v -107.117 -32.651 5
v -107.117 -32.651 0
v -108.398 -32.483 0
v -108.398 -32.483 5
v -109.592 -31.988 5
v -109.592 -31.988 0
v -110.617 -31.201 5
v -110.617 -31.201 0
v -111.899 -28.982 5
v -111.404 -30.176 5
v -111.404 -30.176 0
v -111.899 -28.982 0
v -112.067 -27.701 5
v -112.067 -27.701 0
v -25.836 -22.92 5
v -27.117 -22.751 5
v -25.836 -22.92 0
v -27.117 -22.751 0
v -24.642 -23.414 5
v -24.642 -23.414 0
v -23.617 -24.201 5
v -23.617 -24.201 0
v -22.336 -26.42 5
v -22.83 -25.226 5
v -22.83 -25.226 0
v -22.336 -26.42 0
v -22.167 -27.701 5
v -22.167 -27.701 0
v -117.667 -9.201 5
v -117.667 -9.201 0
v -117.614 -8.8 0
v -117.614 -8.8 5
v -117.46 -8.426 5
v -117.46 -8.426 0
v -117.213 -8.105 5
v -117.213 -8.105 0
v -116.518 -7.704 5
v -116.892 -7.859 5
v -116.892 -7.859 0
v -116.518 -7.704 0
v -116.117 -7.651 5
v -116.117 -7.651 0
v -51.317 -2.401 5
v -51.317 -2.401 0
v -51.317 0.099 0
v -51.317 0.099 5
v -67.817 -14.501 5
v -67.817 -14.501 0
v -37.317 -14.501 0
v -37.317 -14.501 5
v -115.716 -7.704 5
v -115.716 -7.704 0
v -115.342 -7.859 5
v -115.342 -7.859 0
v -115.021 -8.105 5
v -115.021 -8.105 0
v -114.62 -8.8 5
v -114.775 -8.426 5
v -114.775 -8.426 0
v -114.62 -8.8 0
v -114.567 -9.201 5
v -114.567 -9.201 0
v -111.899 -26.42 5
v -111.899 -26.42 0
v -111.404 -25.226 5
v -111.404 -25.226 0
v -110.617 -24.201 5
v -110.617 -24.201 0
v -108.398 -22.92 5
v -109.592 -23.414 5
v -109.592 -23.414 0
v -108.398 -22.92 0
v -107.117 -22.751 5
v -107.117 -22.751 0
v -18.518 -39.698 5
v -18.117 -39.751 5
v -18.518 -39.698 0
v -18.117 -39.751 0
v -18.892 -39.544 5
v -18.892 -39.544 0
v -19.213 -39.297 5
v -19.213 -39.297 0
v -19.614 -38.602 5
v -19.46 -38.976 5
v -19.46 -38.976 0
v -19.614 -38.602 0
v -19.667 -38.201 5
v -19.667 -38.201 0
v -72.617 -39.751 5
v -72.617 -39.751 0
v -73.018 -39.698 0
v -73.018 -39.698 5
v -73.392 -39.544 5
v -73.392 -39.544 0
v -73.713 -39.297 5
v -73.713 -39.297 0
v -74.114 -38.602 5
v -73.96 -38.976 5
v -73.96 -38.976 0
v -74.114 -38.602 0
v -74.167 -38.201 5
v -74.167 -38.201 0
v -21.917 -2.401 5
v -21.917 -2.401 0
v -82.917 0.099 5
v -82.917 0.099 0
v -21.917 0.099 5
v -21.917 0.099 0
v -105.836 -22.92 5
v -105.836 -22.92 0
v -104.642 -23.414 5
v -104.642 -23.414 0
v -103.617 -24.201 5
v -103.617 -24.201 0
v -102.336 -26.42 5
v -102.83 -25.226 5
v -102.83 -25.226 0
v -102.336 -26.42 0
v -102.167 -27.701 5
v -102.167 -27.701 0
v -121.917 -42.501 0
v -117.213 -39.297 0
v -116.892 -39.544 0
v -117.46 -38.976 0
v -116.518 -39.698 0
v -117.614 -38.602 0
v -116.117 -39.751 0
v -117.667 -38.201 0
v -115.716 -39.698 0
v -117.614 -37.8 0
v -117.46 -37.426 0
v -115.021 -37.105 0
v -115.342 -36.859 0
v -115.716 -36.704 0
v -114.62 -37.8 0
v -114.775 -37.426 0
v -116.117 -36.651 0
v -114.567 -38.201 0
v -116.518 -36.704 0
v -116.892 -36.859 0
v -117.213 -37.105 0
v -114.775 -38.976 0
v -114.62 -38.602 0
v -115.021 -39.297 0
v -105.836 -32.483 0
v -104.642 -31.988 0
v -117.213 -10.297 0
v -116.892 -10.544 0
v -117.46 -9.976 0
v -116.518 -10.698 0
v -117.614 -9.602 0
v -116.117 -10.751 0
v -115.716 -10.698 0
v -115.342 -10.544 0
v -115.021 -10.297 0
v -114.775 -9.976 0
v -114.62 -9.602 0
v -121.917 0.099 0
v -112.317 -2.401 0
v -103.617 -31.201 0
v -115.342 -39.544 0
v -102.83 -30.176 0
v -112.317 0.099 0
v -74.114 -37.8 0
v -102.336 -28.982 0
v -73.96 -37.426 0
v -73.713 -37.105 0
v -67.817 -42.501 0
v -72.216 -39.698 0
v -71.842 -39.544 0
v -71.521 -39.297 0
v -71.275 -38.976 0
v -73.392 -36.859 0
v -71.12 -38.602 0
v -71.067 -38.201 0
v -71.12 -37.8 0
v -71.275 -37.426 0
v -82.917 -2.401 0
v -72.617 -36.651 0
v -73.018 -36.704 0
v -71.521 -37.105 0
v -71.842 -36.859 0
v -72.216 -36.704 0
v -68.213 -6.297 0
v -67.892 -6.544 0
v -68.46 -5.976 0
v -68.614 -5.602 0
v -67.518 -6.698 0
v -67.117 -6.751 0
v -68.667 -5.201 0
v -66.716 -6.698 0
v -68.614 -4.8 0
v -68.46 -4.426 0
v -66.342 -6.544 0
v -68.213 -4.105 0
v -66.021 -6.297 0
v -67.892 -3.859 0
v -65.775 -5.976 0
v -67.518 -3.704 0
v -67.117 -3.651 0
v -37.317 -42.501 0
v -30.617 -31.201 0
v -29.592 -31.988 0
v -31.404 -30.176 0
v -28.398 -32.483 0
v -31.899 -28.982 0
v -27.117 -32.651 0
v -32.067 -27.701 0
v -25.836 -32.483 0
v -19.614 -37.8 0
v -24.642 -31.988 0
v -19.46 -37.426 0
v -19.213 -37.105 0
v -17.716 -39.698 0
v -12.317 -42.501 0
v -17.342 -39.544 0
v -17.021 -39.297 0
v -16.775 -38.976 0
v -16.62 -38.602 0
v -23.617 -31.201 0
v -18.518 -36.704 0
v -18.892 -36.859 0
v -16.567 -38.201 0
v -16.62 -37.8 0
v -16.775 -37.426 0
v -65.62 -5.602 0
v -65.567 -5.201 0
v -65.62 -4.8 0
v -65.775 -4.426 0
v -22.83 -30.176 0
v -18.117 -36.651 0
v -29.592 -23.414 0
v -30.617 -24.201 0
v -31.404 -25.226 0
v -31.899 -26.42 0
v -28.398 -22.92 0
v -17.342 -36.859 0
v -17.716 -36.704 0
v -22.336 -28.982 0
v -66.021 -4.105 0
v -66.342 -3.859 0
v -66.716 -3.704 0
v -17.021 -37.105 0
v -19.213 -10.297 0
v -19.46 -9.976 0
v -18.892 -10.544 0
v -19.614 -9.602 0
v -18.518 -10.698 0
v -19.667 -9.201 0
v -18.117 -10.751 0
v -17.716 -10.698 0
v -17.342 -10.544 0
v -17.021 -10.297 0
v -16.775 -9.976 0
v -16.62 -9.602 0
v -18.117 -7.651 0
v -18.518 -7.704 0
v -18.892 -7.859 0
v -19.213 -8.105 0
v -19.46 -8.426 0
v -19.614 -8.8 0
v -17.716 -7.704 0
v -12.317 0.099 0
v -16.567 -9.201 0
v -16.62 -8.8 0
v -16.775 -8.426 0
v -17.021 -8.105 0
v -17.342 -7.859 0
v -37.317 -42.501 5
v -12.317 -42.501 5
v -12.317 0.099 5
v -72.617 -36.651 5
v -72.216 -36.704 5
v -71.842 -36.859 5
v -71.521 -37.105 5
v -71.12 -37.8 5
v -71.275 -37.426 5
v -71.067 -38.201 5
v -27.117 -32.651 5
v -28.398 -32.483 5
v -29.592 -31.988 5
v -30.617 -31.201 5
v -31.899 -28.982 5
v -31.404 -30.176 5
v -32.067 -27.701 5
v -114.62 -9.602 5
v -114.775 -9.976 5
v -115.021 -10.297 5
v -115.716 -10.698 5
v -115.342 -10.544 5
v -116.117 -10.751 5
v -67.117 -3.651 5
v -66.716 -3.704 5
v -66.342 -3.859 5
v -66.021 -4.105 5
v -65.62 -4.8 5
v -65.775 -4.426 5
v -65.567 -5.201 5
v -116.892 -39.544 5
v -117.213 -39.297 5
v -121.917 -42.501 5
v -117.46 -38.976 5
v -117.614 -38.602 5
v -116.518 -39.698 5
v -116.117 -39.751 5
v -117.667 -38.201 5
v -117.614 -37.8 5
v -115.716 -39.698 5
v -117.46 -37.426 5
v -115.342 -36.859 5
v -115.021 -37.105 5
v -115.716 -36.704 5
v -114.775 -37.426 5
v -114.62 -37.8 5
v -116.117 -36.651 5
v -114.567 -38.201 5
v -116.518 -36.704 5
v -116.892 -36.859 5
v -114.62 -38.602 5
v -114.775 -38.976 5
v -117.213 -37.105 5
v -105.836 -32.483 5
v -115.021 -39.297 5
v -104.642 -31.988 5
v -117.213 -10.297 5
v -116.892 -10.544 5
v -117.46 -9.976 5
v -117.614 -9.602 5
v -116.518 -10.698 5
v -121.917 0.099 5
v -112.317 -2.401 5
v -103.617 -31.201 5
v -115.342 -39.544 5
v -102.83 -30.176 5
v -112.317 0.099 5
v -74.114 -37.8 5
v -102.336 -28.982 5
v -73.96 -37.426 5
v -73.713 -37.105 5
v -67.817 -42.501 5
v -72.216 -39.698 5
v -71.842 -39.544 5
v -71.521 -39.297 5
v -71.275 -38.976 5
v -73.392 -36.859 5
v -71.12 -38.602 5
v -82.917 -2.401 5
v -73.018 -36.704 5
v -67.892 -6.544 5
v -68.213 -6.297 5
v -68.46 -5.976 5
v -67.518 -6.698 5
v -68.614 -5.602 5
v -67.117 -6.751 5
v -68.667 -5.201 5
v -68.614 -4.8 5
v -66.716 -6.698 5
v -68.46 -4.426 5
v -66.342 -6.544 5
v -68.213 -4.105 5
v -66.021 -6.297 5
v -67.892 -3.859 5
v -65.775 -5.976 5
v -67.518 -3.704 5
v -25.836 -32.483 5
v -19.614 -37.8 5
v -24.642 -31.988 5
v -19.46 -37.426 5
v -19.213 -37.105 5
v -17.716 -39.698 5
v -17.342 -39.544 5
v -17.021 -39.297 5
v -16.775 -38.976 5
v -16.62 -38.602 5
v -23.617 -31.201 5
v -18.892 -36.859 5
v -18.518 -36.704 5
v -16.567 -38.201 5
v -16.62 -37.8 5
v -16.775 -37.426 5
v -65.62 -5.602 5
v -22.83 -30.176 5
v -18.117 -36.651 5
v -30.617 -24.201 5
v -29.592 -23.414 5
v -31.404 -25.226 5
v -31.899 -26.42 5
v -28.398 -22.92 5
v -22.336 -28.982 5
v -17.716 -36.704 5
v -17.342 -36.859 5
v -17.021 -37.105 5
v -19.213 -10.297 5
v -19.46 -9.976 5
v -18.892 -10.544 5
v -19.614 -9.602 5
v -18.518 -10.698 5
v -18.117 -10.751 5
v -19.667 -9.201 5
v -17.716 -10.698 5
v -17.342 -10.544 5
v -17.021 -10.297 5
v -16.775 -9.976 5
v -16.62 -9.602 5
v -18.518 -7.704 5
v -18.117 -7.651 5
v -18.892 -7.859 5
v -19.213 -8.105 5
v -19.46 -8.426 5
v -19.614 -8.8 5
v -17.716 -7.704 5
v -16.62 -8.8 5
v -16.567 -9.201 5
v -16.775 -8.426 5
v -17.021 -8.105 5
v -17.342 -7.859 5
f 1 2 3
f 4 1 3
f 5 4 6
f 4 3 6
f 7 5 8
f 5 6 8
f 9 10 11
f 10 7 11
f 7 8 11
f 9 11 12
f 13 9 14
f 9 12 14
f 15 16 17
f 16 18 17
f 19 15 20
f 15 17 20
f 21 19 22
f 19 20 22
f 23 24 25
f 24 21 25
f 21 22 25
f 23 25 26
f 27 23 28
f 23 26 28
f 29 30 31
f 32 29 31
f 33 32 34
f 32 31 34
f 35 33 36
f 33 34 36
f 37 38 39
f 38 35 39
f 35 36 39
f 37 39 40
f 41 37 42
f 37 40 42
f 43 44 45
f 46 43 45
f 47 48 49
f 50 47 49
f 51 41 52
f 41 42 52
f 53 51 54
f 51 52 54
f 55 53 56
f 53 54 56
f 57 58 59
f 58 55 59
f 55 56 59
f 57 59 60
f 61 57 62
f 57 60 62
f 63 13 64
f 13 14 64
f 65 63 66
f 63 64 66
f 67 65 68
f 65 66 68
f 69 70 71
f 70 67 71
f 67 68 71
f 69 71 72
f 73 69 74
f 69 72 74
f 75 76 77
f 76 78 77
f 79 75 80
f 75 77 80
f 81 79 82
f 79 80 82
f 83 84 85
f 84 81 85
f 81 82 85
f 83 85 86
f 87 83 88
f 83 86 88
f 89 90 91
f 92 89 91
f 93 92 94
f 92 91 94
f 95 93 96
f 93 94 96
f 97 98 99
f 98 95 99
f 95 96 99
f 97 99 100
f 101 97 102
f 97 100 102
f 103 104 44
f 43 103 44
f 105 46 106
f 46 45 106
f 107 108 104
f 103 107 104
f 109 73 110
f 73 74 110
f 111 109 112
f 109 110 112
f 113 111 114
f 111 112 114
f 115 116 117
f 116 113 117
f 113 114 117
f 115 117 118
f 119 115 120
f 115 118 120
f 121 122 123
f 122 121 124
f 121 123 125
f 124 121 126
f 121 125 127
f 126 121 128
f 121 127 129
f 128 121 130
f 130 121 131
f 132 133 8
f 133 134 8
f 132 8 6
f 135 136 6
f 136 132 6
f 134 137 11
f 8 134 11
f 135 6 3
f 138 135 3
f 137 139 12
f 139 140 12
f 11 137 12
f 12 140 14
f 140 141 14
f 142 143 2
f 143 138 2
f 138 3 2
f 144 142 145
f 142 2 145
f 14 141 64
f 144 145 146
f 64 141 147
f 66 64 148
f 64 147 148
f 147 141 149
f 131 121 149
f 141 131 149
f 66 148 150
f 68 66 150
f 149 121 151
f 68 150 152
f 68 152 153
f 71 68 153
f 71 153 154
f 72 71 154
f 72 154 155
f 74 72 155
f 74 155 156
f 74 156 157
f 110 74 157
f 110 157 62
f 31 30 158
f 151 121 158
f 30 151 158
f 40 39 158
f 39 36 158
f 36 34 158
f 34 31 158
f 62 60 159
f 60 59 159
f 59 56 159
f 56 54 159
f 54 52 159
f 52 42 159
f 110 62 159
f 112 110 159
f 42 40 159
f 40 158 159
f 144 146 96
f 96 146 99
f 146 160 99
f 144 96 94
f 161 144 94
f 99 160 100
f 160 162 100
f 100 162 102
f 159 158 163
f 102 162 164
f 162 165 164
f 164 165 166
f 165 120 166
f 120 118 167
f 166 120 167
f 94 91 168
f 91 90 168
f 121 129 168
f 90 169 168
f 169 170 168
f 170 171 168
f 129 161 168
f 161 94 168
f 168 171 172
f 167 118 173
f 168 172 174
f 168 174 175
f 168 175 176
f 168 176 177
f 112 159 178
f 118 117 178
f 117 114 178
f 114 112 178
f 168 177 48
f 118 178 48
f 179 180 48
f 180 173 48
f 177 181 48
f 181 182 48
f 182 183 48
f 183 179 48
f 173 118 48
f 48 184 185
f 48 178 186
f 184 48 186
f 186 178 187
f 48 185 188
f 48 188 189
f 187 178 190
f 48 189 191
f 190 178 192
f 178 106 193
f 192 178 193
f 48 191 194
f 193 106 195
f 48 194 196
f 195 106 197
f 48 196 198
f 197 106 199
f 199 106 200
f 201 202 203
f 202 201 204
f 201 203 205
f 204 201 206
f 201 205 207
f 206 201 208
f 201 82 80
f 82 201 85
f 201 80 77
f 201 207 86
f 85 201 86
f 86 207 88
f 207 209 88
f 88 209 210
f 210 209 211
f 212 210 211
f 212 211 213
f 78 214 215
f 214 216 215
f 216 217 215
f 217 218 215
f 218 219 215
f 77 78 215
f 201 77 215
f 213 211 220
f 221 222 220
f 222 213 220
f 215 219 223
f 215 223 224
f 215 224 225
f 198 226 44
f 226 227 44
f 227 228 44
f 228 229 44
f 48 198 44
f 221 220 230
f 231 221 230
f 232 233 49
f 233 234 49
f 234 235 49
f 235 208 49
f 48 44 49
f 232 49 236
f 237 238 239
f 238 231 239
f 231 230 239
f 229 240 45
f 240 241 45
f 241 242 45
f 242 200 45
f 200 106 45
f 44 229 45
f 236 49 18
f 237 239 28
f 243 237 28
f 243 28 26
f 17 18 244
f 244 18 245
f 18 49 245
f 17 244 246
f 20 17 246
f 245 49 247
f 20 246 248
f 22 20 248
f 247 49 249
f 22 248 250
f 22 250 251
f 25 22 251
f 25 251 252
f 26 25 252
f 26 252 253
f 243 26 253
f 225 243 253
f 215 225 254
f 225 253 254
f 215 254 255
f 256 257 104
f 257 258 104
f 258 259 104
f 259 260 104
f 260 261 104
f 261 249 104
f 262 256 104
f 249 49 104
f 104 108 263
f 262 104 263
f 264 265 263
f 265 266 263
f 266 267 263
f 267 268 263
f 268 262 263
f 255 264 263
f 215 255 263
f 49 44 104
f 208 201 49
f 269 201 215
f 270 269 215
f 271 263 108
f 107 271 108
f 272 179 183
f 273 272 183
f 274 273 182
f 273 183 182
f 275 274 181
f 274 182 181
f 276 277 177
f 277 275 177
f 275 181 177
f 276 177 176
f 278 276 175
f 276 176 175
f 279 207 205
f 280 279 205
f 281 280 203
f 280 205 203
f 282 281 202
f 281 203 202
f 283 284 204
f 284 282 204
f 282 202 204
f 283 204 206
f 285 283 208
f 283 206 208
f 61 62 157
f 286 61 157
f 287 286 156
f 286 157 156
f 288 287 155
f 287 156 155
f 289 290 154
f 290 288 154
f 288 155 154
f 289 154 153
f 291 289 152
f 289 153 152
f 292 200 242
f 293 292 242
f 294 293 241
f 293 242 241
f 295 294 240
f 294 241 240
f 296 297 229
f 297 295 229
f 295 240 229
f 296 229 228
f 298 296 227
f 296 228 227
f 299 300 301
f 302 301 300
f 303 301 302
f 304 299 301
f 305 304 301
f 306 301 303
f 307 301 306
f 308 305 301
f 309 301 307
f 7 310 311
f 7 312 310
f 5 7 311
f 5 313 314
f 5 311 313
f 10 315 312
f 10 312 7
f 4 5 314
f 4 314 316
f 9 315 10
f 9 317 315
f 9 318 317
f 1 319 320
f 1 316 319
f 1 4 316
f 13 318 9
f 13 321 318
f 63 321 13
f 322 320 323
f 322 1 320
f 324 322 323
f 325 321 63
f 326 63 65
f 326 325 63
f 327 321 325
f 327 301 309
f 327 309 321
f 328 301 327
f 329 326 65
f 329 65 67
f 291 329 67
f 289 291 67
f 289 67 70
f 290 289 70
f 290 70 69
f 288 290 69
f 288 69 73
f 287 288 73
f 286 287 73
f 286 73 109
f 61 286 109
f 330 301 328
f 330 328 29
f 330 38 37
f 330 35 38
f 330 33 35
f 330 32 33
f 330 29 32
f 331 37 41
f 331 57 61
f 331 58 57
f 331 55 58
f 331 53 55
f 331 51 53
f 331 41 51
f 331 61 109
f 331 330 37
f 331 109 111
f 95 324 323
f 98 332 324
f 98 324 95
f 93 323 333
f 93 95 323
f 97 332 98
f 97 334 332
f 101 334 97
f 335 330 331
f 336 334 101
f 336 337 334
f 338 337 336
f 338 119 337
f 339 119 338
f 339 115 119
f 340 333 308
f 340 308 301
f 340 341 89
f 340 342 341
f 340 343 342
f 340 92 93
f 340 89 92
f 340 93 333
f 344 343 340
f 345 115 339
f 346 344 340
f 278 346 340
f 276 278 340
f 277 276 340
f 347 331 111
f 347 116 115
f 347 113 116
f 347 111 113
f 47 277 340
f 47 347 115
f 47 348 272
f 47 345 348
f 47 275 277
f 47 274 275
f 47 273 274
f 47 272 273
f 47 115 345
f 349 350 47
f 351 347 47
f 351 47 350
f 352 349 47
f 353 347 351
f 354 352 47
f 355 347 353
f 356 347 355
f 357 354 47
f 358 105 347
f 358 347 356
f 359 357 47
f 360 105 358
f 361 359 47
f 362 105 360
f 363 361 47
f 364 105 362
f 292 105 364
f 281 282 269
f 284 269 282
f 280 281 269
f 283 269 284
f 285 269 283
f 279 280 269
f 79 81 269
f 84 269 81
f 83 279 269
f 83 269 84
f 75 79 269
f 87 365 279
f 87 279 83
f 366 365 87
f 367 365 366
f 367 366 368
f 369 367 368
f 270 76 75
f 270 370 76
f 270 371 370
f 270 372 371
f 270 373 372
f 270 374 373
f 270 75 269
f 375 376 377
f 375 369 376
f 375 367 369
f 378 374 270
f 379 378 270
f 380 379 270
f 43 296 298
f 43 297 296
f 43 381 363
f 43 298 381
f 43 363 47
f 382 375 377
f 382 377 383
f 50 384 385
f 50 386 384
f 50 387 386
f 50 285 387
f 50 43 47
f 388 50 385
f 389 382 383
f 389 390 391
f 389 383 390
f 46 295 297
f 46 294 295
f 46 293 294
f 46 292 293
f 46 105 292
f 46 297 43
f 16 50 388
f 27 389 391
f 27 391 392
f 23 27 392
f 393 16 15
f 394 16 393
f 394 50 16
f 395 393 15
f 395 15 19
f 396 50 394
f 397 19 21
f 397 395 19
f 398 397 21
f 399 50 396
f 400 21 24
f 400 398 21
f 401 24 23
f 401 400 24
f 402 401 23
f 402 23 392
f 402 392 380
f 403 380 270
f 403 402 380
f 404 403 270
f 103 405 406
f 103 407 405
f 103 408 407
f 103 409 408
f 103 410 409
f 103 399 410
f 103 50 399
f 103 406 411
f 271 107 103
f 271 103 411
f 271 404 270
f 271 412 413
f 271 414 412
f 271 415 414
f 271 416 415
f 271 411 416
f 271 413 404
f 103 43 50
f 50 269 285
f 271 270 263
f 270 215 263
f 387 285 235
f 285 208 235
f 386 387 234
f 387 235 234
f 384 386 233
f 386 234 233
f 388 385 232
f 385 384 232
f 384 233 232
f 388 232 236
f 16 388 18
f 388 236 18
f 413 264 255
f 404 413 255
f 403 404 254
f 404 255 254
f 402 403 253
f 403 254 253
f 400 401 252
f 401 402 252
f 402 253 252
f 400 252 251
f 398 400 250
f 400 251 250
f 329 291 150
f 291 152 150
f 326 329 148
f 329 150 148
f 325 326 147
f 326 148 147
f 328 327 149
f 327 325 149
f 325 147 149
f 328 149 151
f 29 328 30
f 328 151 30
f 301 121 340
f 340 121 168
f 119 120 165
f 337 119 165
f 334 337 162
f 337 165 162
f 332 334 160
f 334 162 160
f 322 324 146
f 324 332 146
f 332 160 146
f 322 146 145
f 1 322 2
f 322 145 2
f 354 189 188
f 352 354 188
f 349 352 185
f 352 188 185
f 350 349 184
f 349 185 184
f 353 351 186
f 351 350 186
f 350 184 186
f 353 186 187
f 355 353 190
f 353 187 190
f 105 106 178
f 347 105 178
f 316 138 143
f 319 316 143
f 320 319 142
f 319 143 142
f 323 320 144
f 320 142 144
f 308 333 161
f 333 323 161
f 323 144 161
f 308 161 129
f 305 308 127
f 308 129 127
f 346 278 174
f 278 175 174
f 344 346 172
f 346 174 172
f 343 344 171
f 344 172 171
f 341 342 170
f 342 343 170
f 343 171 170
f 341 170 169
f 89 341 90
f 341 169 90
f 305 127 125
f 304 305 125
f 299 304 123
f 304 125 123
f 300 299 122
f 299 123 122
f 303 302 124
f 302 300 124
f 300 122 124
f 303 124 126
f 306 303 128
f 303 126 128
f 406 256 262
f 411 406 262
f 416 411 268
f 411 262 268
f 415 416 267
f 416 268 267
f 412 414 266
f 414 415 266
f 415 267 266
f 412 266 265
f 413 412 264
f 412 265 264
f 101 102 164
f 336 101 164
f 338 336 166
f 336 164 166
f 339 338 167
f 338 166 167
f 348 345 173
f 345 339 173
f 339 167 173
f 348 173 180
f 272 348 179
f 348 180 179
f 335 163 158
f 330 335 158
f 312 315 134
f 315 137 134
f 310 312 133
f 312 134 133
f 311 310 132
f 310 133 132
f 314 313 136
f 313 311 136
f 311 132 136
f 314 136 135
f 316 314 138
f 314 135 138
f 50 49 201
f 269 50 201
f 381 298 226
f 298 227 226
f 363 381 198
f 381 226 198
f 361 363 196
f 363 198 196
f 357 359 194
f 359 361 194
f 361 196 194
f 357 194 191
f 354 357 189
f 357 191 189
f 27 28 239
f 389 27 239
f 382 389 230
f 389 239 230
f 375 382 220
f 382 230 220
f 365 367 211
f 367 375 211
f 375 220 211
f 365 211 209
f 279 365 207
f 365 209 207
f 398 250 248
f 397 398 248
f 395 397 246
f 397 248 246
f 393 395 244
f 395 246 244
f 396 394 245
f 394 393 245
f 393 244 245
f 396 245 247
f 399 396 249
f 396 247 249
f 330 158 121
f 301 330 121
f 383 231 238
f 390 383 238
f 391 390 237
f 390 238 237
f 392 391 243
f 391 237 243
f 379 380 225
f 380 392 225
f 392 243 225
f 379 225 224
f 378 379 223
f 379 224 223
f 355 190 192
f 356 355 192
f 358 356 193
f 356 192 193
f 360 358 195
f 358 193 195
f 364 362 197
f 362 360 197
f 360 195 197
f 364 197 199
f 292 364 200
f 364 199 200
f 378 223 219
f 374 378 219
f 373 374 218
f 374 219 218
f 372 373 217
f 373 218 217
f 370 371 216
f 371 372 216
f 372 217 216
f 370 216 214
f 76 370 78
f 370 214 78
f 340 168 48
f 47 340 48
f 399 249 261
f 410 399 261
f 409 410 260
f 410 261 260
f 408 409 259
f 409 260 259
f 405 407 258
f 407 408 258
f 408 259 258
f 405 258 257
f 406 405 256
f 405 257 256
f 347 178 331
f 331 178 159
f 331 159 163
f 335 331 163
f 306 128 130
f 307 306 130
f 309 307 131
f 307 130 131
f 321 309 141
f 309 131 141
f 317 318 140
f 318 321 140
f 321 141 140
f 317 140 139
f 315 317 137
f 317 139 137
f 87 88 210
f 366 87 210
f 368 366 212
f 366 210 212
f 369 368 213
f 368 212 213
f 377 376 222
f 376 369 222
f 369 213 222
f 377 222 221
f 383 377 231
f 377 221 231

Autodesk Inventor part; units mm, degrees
ref_plane "YZ Plane" through (0, 0, 0) normal (1, 0, 0) x (0, 1, 0)
ref_plane "XZ Plane" through (0, 0, 0) normal (0, 1, 0) x (-1, 0, 0)
ref_plane "XY Plane" through (0, 0, 0) normal (0, 0, 1) x (1, 0, 0)
sketch "Boceto1" plane through (0, 0, 0) normal (0, 0, 1) x (1, 0, 0)
  arc A0 (-116.1173, -7.6512) -> (-117.6673, -9.2012) centre (-116.1173, -9.2012) ccw
  arc A1 (-117.6673, -9.2012) -> (-116.1173, -10.7512) centre (-116.1173, -9.2012) ccw
  arc A2 (-116.1173, -10.7512) -> (-114.5673, -9.2012) centre (-116.1173, -9.2012) ccw
  arc A3 (-114.5673, -9.2012) -> (-116.1173, -7.6512) centre (-116.1173, -9.2012) ccw
  arc A4 (-67.1173, -3.6512) -> (-68.6673, -5.2012) centre (-67.1173, -5.2012) ccw
  arc A5 (-68.6673, -5.2012) -> (-67.1173, -6.7512) centre (-67.1173, -5.2012) ccw
  arc A6 (-67.1173, -6.7512) -> (-65.5673, -5.2012) centre (-67.1173, -5.2012) ccw
  arc A7 (-65.5673, -5.2012) -> (-67.1173, -3.6512) centre (-67.1173, -5.2012) ccw
  arc A8 (-18.1173, -7.6512) -> (-19.6673, -9.2012) centre (-18.1173, -9.2012) ccw
  arc A9 (-19.6673, -9.2012) -> (-18.1173, -10.7512) centre (-18.1173, -9.2012) ccw
  arc A10 (-18.1173, -10.7512) -> (-16.5673, -9.2012) centre (-18.1173, -9.2012) ccw
  arc A11 (-16.5673, -9.2012) -> (-18.1173, -7.6512) centre (-18.1173, -9.2012) ccw
  arc A12 (-72.6173, -36.6512) -> (-74.1673, -38.2012) centre (-72.6173, -38.2012) ccw
  arc A13 (-74.1673, -38.2012) -> (-72.6173, -39.7512) centre (-72.6173, -38.2012) ccw
  arc A14 (-72.6173, -39.7512) -> (-71.0673, -38.2012) centre (-72.6173, -38.2012) ccw
  arc A15 (-71.0673, -38.2012) -> (-72.6173, -36.6512) centre (-72.6173, -38.2012) ccw
  arc A16 (-18.1173, -36.6512) -> (-19.6673, -38.2012) centre (-18.1173, -38.2012) ccw
  arc A17 (-19.6673, -38.2012) -> (-18.1173, -39.7512) centre (-18.1173, -38.2012) ccw
  arc A18 (-18.1173, -39.7512) -> (-16.5673, -38.2012) centre (-18.1173, -38.2012) ccw
  arc A19 (-16.5673, -38.2012) -> (-18.1173, -36.6512) centre (-18.1173, -38.2012) ccw
  arc A20 (-116.1173, -36.6512) -> (-117.6673, -38.2012) centre (-116.1173, -38.2012) ccw
  arc A21 (-117.6673, -38.2012) -> (-116.1173, -39.7512) centre (-116.1173, -38.2012) ccw
  arc A22 (-116.1173, -39.7512) -> (-114.5673, -38.2012) centre (-116.1173, -38.2012) ccw
  arc A23 (-114.5673, -38.2012) -> (-116.1173, -36.6512) centre (-116.1173, -38.2012) ccw
  arc A24 (-107.1173, -22.7512) -> (-112.0673, -27.7012) centre (-107.1173, -27.7012) ccw
  arc A25 (-112.0673, -27.7012) -> (-107.1173, -32.6512) centre (-107.1173, -27.7012) ccw
  arc A26 (-107.1173, -32.6512) -> (-102.1673, -27.7012) centre (-107.1173, -27.7012) ccw
  arc A27 (-102.1673, -27.7012) -> (-107.1173, -22.7512) centre (-107.1173, -27.7012) ccw
  arc A28 (-27.1173, -22.7512) -> (-32.0673, -27.7012) centre (-27.1173, -27.7012) ccw
  arc A29 (-32.0673, -27.7012) -> (-27.1173, -32.6512) centre (-27.1173, -27.7012) ccw
  arc A30 (-27.1173, -32.6512) -> (-22.1673, -27.7012) centre (-27.1173, -27.7012) ccw
  arc A31 (-22.1673, -27.7012) -> (-27.1173, -22.7512) centre (-27.1173, -27.7012) ccw
  line L0 (-67.8173, -14.5012) -> (-37.3173, -14.5012)
  line L1 (-37.3173, -14.5012) -> (-37.3173, -42.5012)
  line L2 (-37.3173, -42.5012) -> (-12.3173, -42.5012)
  line L3 (-12.3173, -42.5012) -> (-12.3173, 0.0988)
  line L4 (-12.3173, 0.0988) -> (-21.9173, 0.0988)
  line L5 (-21.9173, 0.0988) -> (-21.9173, -2.4012)
  line L6 (-21.9173, -2.4012) -> (-51.3173, -2.4012)
  line L7 (-51.3173, -2.4012) -> (-51.3173, 0.0988)
  line L8 (-51.3173, 0.0988) -> (-82.9173, 0.0988)
  line L9 (-82.9173, 0.0988) -> (-82.9173, -2.4012)
  line L10 (-82.9173, -2.4012) -> (-112.3173, -2.4012)
  line L11 (-112.3173, -2.4012) -> (-112.3173, 0.0988)
  line L12 (-112.3173, 0.0988) -> (-121.9173, 0.0988)
  line L13 (-121.9173, 0.0988) -> (-121.9173, -42.5012)
  line L14 (-121.9173, -42.5012) -> (-67.8173, -42.5012)
  line L15 (-67.8173, -42.5012) -> (-67.8173, -14.5012)
  point P0 (0, 0)
extrude "Extrusión1" add sketch "Boceto1" along normal blind 5
properties part number "carro x lado polea pieza2"
